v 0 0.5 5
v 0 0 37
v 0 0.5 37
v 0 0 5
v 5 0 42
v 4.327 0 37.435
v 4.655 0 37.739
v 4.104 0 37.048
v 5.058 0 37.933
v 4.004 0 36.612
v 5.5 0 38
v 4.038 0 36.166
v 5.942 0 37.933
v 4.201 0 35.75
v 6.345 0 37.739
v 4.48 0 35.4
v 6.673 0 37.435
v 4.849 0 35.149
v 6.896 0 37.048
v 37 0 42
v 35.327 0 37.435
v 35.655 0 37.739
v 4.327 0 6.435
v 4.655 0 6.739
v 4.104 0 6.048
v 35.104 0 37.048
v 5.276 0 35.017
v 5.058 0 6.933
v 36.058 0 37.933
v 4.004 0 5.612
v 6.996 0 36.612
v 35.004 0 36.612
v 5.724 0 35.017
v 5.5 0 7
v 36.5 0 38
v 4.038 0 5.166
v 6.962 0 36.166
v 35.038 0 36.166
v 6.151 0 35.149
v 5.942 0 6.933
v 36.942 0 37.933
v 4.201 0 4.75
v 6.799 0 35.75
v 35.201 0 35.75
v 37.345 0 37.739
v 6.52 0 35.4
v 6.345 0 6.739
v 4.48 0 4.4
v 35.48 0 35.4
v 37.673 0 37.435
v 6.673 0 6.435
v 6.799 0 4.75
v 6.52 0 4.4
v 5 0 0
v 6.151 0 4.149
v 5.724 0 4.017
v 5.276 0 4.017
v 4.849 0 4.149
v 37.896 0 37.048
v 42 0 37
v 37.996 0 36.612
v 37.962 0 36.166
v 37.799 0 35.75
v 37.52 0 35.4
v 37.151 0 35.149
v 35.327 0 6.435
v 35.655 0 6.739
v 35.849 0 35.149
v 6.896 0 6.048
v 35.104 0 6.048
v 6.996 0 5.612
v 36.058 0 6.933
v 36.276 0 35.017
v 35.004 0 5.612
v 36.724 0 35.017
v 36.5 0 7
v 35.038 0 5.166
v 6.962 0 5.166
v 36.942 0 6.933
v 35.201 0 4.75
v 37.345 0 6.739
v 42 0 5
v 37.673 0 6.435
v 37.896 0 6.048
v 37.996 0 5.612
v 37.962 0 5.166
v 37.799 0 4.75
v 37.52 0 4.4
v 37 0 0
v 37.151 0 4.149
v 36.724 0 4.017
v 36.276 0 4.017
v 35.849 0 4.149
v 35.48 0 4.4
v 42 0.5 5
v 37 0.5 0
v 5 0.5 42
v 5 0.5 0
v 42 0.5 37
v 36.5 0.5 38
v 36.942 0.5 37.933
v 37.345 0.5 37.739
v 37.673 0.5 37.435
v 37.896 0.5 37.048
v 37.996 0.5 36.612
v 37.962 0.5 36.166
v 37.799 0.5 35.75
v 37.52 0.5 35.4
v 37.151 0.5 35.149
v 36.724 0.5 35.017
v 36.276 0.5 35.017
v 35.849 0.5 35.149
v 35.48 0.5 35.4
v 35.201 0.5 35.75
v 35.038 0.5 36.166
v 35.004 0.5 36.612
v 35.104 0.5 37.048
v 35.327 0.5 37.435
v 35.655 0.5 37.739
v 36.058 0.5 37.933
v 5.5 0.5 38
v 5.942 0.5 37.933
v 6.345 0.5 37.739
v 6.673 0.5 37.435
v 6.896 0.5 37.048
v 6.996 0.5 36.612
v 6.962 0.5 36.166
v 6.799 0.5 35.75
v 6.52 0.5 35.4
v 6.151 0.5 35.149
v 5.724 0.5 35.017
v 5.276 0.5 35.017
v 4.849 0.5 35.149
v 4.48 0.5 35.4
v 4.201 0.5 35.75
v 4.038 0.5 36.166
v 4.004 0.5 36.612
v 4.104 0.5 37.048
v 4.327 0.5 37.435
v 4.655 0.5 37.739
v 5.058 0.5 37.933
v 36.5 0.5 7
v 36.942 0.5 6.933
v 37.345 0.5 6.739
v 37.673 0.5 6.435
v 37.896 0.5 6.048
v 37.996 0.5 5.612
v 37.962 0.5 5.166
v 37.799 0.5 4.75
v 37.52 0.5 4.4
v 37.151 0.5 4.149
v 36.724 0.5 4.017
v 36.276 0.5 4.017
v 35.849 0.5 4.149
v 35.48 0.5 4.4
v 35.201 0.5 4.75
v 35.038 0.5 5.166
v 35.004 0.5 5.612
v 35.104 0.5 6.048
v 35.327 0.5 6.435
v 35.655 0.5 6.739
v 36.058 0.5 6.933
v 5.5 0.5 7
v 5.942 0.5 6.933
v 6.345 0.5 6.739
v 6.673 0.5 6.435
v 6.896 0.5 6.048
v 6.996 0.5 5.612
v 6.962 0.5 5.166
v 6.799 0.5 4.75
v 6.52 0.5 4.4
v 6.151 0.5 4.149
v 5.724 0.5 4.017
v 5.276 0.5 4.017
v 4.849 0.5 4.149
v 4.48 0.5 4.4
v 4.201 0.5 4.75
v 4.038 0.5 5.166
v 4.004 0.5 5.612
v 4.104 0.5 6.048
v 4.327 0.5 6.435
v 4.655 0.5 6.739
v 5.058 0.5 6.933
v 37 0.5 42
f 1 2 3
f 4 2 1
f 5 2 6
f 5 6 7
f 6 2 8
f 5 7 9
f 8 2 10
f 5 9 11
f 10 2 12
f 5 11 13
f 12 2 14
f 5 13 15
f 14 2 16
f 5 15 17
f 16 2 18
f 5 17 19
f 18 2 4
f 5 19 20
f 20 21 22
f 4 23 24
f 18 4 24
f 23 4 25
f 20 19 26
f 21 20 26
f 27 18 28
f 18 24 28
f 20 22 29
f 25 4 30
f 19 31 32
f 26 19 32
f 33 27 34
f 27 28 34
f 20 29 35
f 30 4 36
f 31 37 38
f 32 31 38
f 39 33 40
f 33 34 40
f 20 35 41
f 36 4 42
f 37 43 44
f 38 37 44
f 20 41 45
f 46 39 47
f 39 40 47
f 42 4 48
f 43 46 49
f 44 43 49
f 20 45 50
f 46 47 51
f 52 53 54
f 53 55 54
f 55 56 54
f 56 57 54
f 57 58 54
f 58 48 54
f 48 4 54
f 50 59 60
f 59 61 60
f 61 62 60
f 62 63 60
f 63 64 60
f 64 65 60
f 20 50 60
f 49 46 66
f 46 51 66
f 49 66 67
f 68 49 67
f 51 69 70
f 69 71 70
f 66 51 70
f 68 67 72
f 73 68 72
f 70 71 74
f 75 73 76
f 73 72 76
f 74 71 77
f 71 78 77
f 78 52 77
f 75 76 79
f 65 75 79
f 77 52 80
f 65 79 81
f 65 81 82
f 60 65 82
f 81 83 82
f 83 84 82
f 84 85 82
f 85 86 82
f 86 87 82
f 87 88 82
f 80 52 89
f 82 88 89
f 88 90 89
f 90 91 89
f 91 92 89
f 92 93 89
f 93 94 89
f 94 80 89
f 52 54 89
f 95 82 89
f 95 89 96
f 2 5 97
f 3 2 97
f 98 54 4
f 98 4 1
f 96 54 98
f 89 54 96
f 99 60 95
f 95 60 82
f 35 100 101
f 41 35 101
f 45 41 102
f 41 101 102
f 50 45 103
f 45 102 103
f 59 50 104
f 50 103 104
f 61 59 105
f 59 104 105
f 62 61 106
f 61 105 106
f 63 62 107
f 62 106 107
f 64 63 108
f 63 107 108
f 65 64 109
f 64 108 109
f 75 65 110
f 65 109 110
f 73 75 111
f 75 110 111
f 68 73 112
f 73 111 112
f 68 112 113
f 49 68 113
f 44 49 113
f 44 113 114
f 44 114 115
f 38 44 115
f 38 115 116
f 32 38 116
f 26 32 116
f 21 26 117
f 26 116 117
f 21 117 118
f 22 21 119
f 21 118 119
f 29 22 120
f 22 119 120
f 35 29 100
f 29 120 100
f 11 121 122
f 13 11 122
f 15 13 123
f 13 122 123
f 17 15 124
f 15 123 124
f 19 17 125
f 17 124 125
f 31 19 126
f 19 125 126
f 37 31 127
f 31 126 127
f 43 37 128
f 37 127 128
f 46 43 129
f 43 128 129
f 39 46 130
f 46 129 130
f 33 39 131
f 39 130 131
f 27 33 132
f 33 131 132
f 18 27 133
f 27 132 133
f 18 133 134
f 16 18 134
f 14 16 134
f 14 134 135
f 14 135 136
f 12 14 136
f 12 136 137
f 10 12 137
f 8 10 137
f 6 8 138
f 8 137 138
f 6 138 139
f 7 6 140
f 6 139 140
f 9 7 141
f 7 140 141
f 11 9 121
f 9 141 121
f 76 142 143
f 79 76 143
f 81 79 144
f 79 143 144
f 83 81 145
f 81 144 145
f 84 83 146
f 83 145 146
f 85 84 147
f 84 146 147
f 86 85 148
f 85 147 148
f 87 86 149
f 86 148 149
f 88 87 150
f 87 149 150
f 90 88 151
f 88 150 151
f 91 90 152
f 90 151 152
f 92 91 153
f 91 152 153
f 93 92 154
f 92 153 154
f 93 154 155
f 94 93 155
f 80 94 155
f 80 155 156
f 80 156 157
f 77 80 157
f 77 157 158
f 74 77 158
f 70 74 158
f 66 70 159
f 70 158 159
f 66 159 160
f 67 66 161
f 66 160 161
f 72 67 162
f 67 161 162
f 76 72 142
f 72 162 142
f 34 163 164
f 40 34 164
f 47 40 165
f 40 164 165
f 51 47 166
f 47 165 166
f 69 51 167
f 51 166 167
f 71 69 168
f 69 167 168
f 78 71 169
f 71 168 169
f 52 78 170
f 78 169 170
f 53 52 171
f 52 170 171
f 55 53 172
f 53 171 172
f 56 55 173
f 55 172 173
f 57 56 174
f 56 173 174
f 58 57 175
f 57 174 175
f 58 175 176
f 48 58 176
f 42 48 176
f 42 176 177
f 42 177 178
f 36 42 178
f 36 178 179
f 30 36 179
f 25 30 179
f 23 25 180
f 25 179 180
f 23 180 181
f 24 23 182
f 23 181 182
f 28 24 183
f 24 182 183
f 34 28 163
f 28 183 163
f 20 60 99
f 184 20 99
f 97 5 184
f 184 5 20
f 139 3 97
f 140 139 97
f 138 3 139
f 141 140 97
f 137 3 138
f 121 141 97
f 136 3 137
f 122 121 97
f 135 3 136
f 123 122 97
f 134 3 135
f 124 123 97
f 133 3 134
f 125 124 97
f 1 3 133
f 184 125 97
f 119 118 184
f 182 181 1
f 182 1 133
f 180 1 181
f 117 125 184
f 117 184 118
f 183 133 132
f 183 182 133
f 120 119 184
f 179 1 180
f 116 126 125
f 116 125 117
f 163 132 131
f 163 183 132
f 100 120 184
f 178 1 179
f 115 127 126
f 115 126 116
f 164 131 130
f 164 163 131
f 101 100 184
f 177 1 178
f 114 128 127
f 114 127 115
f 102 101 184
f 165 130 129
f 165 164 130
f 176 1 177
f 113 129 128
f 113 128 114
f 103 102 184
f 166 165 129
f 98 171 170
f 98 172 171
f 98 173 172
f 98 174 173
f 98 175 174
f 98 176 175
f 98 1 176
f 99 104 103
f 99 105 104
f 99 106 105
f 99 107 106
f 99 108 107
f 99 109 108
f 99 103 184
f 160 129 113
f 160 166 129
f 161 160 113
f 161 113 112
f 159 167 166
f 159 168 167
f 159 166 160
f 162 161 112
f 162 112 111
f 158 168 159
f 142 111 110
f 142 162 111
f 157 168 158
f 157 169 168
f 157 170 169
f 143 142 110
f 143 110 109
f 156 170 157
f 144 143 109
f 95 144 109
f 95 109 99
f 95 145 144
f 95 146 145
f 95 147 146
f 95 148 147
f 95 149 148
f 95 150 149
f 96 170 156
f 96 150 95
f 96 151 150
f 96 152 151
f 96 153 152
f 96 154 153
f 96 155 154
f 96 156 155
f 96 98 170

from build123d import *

# Parameters (mm, degrees)
CROQUIS1_W              = 42
CROQUIS1_H              = 42
SALIENTE_EXTRUIR1_DEPTH = 0.5
CROQUIS2_R              = 1.5
CORTAR_EXTRUIR1_DEPTH   = 0.5
CHAFL_N1_SIZE           = 5


with BuildPart() as part:
    # Croquis1 → Saliente-Extruir1 (new body)
    with BuildSketch(Plane(origin=(0, 0, 0), x_dir=(1, 0, 0), z_dir=(0, 1, 0))):
        with Locations((21, -21)):
            Rectangle(CROQUIS1_W, CROQUIS1_H)
    extrude(amount=SALIENTE_EXTRUIR1_DEPTH)

    # Croquis2 → Cortar-Extruir1 (cut)
    with BuildSketch(Plane(origin=(0, 0.5, 0), x_dir=(1, 0, 0), z_dir=(0, 1, 0))):
        with Locations(Location((5.5, -5.5, 0), (0, 0, 270))):
            Circle(CROQUIS2_R)
        with Locations(Location((36.5, -5.5, 0), (0, 0, 270))):
            Circle(CROQUIS2_R)
        with Locations(Location((36.5, -36.5, 0), (0, 0, 270))):
            Circle(CROQUIS2_R)
        with Locations(Location((5.5, -36.5, 0), (0, 0, 270))):
            Circle(CROQUIS2_R)
    extrude(amount=-CORTAR_EXTRUIR1_DEPTH, mode=Mode.SUBTRACT)

    # Chaflán1
    chafl_n1_edges = [part.edges().sort_by_distance(p)[0] for p in [
        (0, 0.25, 0),
        (42, 0.25, 0),
        (42, 0.25, 42),
        (0, 0.25, 42),
    ]]
    chamfer(chafl_n1_edges, length=CHAFL_N1_SIZE)


solid = part.part
